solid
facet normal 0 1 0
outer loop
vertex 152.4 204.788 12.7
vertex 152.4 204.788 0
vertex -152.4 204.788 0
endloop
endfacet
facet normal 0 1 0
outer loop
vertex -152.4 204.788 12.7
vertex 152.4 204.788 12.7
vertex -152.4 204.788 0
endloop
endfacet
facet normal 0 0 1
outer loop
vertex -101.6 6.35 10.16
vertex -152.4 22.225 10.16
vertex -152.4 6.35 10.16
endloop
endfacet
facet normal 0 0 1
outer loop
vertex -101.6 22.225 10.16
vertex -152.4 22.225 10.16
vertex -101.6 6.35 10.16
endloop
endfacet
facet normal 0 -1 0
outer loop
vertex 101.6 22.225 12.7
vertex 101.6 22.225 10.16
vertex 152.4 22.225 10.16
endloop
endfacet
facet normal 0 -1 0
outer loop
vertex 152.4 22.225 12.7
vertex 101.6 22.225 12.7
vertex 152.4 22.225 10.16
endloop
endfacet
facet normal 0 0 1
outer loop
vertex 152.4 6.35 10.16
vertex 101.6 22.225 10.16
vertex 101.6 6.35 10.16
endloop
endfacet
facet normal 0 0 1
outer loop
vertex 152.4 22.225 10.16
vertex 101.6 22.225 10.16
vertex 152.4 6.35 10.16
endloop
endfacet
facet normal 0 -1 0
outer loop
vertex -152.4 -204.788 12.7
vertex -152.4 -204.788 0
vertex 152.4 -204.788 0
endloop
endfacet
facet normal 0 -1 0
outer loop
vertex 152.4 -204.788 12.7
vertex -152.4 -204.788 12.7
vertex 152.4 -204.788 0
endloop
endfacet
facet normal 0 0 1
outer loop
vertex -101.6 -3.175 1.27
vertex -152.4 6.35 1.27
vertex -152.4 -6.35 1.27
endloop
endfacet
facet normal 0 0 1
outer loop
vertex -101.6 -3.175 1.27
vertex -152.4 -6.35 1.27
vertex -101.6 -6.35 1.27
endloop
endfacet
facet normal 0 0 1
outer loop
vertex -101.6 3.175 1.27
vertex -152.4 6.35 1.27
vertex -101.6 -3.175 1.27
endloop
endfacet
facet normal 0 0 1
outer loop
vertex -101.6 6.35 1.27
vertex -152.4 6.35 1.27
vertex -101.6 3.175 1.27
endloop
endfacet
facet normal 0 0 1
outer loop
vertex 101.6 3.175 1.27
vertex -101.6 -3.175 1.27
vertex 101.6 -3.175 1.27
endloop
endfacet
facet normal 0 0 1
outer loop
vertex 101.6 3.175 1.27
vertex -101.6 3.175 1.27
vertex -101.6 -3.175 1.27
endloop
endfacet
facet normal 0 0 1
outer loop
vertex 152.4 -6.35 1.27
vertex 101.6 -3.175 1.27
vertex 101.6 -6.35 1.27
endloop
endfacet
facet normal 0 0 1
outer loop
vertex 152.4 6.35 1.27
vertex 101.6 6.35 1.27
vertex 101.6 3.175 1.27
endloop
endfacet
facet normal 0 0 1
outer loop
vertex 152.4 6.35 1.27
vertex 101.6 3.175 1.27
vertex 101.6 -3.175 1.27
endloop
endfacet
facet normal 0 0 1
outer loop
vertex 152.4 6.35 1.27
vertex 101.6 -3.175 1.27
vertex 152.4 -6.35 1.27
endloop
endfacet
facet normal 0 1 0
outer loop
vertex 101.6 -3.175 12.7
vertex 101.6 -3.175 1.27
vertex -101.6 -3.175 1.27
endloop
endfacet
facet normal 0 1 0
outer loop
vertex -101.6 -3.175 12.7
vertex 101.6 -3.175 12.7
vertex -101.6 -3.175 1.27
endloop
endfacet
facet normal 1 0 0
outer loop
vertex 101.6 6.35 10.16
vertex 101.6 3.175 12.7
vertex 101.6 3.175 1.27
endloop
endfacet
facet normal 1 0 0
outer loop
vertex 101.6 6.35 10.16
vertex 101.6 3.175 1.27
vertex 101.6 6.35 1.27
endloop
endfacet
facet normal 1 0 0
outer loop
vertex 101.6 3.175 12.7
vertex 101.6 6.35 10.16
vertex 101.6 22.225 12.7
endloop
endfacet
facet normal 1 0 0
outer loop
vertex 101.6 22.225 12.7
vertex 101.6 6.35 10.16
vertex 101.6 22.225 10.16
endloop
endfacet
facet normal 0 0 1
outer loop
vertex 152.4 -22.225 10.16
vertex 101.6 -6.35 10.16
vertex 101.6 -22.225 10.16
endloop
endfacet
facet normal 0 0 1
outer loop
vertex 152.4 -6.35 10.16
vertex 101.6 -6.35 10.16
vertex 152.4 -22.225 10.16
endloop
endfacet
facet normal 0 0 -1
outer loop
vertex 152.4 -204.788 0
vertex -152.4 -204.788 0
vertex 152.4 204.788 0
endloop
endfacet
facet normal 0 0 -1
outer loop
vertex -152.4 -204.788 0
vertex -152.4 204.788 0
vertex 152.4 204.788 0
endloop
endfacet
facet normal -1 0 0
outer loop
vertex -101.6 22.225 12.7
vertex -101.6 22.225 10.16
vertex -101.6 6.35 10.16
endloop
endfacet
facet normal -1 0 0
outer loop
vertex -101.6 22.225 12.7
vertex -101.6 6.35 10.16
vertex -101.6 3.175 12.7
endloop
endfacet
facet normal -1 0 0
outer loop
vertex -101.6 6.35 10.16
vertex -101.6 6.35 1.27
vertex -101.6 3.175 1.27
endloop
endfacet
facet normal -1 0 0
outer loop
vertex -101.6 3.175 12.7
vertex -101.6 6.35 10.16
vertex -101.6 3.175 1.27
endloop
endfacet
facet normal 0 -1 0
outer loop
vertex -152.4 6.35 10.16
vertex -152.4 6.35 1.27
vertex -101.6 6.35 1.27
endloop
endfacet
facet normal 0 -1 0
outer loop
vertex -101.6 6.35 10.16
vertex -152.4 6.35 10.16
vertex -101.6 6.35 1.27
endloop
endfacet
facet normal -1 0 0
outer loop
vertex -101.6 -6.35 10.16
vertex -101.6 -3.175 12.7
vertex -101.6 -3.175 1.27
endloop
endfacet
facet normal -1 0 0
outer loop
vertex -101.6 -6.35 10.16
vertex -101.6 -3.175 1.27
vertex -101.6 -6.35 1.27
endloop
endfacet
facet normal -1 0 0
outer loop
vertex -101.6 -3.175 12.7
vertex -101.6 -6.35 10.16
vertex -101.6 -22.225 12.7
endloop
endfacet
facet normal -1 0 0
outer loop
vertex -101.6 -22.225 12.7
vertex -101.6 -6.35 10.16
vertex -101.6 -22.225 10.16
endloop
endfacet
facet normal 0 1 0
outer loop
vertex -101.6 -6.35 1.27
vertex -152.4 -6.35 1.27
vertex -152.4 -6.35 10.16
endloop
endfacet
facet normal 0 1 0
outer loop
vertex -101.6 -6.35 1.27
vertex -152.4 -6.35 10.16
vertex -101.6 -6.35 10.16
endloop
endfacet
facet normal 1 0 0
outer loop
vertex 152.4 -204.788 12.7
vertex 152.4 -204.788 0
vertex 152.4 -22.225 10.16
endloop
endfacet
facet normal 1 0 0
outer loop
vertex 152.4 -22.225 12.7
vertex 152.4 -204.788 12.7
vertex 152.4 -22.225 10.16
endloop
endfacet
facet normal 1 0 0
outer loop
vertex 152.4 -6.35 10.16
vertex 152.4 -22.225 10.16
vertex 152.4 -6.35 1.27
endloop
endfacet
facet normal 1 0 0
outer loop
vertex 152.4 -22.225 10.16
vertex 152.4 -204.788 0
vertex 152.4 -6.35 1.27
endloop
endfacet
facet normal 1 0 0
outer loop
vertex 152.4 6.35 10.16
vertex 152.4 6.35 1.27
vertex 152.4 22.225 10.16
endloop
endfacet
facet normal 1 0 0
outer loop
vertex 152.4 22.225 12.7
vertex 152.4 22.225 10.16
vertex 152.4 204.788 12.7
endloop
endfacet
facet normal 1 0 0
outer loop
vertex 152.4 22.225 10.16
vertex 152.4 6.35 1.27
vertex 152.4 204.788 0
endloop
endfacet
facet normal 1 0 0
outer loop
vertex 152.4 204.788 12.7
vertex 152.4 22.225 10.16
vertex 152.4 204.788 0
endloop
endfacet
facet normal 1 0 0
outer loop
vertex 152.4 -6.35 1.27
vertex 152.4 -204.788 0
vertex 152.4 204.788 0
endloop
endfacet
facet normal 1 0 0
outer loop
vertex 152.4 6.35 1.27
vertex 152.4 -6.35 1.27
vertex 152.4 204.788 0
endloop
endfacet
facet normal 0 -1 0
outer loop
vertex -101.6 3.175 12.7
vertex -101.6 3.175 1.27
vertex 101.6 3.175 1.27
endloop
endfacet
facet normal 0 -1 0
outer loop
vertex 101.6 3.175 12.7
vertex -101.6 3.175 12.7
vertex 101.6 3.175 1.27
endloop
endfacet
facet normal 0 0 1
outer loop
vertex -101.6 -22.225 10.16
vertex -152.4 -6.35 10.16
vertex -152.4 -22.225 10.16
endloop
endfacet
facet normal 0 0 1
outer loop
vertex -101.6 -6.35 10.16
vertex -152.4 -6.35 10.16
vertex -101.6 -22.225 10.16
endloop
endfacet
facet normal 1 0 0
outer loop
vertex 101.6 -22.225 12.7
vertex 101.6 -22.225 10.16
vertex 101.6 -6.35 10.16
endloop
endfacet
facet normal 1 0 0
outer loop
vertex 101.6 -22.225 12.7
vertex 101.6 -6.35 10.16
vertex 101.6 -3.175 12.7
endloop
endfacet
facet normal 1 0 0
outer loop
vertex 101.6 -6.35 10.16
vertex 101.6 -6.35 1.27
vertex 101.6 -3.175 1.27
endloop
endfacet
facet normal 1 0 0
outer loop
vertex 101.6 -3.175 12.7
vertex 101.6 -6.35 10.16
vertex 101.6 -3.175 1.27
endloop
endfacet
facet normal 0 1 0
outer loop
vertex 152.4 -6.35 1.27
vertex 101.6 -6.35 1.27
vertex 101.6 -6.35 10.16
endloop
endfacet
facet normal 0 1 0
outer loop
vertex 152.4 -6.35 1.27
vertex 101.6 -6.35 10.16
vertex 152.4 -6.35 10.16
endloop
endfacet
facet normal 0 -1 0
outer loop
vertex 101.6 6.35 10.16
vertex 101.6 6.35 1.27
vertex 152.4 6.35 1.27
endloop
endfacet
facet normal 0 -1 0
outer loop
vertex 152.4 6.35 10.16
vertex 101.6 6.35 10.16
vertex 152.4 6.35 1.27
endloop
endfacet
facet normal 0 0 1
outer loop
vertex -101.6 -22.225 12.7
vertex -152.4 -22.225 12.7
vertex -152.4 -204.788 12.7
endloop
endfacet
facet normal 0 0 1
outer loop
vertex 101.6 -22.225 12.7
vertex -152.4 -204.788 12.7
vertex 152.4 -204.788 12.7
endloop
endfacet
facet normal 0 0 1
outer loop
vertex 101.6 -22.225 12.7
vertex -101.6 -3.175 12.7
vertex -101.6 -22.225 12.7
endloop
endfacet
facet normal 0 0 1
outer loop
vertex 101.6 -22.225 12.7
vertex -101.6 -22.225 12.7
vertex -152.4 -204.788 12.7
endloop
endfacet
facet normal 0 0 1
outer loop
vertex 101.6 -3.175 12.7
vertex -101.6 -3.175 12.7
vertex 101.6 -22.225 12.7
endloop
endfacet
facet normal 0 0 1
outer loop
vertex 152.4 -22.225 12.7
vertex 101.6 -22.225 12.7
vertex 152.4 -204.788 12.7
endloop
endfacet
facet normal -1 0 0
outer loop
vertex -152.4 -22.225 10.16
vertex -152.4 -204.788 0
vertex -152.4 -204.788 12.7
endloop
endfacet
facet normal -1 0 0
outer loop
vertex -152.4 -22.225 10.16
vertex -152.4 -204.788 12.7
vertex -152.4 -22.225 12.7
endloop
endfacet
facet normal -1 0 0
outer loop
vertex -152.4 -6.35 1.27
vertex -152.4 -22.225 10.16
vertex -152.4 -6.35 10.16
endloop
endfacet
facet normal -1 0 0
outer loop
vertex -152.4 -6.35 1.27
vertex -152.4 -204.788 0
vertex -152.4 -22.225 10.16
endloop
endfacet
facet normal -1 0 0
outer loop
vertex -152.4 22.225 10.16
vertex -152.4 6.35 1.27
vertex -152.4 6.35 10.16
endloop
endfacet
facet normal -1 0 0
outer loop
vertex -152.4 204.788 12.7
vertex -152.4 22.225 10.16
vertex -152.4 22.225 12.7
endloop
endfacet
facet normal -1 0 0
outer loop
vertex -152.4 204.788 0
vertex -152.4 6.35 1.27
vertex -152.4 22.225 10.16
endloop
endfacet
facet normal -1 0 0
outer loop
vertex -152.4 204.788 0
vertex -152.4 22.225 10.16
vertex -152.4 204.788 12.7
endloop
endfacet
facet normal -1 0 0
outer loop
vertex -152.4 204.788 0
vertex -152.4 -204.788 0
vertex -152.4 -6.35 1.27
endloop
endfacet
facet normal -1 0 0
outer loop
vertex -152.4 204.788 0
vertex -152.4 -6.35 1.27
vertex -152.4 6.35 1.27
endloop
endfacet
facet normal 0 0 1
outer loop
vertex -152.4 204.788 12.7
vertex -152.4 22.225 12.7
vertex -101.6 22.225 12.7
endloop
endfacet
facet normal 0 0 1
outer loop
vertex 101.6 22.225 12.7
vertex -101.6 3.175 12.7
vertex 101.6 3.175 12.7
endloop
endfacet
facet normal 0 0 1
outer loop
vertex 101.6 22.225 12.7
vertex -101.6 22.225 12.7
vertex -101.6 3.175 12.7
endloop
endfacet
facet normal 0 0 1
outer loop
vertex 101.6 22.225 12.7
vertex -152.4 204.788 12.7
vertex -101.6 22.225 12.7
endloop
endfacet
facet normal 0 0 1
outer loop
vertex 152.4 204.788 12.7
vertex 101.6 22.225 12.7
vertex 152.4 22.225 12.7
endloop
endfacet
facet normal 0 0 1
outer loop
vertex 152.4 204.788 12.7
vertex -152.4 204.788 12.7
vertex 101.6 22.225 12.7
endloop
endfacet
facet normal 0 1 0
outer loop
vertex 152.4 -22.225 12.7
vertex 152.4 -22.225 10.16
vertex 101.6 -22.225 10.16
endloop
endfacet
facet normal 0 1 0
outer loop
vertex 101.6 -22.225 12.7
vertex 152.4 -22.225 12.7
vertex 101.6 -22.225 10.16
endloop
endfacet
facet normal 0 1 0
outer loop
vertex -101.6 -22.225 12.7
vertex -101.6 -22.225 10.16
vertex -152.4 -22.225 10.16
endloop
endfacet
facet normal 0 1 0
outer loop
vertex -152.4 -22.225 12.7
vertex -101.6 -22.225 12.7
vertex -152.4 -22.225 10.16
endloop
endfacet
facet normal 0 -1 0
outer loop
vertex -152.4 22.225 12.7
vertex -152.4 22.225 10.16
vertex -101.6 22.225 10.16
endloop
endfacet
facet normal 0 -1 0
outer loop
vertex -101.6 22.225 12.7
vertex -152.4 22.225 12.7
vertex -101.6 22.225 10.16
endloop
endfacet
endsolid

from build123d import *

# Parameters (mm, degrees)
F0_W     = 50.8
F0_H     = 3.175
F1_DEPTH = 1.27
F2_DEPTH = 12.7
F0_H_2   = 15.875
F3_DEPTH = 10.16


with BuildPart() as f1:
    # F0 (on Top) → F1 (new body)
    with BuildSketch(Plane.XY):
        with Locations((-127, 4.7625)):
            Rectangle(F0_W, F0_H)
        Polygon((101.6, -3.175), (152.4, -3.175), (152.4, 3.175), (101.6, 3.175), (-101.6, 3.175), (-152.4, 3.175), (-152.4, 0), (-152.4, -3.175), (-101.6, -3.175), align=None)
        with Locations((-127, -4.7625)):
            Rectangle(F0_W, F0_H)
        with Locations((127, -4.7625)):
            Rectangle(F0_W, F0_H)
        with Locations((127, 4.7625)):
            Rectangle(F0_W, F0_H)
    extrude(amount=F1_DEPTH)

    # F0 (on Top) → F2 (join)
    with BuildSketch(Plane.XY):
        Polygon((-101.6, 3.175), (101.6, 3.175), (101.6, 6.35), (101.6, 22.225), (152.4, 22.225), (152.4, 204.7875), (-152.4, 204.7875), (-152.4, 22.225), (-101.6, 22.225), (-101.6, 6.35), align=None)
        Polygon((-152.4, -204.7875), (152.4, -204.7875), (152.4, -22.225), (101.6, -22.225), (101.6, -6.35), (101.6, -3.175), (-101.6, -3.175), (-101.6, -6.35), (-101.6, -22.225), (-152.4, -22.225), align=None)
    extrude(amount=F2_DEPTH)

    # F0 (on Top) → F3 (join)
    with BuildSketch(Plane.XY):
        with Locations((-127, 14.2875)):
            Rectangle(F0_W, F0_H_2)
        with Locations((-127, -14.2875)):
            Rectangle(F0_W, F0_H_2)
        with Locations((127, -14.2875)):
            Rectangle(F0_W, F0_H_2)
        with Locations((127, 14.2875)):
            Rectangle(F0_W, F0_H_2)
    extrude(amount=F3_DEPTH)


solid = f1.part
